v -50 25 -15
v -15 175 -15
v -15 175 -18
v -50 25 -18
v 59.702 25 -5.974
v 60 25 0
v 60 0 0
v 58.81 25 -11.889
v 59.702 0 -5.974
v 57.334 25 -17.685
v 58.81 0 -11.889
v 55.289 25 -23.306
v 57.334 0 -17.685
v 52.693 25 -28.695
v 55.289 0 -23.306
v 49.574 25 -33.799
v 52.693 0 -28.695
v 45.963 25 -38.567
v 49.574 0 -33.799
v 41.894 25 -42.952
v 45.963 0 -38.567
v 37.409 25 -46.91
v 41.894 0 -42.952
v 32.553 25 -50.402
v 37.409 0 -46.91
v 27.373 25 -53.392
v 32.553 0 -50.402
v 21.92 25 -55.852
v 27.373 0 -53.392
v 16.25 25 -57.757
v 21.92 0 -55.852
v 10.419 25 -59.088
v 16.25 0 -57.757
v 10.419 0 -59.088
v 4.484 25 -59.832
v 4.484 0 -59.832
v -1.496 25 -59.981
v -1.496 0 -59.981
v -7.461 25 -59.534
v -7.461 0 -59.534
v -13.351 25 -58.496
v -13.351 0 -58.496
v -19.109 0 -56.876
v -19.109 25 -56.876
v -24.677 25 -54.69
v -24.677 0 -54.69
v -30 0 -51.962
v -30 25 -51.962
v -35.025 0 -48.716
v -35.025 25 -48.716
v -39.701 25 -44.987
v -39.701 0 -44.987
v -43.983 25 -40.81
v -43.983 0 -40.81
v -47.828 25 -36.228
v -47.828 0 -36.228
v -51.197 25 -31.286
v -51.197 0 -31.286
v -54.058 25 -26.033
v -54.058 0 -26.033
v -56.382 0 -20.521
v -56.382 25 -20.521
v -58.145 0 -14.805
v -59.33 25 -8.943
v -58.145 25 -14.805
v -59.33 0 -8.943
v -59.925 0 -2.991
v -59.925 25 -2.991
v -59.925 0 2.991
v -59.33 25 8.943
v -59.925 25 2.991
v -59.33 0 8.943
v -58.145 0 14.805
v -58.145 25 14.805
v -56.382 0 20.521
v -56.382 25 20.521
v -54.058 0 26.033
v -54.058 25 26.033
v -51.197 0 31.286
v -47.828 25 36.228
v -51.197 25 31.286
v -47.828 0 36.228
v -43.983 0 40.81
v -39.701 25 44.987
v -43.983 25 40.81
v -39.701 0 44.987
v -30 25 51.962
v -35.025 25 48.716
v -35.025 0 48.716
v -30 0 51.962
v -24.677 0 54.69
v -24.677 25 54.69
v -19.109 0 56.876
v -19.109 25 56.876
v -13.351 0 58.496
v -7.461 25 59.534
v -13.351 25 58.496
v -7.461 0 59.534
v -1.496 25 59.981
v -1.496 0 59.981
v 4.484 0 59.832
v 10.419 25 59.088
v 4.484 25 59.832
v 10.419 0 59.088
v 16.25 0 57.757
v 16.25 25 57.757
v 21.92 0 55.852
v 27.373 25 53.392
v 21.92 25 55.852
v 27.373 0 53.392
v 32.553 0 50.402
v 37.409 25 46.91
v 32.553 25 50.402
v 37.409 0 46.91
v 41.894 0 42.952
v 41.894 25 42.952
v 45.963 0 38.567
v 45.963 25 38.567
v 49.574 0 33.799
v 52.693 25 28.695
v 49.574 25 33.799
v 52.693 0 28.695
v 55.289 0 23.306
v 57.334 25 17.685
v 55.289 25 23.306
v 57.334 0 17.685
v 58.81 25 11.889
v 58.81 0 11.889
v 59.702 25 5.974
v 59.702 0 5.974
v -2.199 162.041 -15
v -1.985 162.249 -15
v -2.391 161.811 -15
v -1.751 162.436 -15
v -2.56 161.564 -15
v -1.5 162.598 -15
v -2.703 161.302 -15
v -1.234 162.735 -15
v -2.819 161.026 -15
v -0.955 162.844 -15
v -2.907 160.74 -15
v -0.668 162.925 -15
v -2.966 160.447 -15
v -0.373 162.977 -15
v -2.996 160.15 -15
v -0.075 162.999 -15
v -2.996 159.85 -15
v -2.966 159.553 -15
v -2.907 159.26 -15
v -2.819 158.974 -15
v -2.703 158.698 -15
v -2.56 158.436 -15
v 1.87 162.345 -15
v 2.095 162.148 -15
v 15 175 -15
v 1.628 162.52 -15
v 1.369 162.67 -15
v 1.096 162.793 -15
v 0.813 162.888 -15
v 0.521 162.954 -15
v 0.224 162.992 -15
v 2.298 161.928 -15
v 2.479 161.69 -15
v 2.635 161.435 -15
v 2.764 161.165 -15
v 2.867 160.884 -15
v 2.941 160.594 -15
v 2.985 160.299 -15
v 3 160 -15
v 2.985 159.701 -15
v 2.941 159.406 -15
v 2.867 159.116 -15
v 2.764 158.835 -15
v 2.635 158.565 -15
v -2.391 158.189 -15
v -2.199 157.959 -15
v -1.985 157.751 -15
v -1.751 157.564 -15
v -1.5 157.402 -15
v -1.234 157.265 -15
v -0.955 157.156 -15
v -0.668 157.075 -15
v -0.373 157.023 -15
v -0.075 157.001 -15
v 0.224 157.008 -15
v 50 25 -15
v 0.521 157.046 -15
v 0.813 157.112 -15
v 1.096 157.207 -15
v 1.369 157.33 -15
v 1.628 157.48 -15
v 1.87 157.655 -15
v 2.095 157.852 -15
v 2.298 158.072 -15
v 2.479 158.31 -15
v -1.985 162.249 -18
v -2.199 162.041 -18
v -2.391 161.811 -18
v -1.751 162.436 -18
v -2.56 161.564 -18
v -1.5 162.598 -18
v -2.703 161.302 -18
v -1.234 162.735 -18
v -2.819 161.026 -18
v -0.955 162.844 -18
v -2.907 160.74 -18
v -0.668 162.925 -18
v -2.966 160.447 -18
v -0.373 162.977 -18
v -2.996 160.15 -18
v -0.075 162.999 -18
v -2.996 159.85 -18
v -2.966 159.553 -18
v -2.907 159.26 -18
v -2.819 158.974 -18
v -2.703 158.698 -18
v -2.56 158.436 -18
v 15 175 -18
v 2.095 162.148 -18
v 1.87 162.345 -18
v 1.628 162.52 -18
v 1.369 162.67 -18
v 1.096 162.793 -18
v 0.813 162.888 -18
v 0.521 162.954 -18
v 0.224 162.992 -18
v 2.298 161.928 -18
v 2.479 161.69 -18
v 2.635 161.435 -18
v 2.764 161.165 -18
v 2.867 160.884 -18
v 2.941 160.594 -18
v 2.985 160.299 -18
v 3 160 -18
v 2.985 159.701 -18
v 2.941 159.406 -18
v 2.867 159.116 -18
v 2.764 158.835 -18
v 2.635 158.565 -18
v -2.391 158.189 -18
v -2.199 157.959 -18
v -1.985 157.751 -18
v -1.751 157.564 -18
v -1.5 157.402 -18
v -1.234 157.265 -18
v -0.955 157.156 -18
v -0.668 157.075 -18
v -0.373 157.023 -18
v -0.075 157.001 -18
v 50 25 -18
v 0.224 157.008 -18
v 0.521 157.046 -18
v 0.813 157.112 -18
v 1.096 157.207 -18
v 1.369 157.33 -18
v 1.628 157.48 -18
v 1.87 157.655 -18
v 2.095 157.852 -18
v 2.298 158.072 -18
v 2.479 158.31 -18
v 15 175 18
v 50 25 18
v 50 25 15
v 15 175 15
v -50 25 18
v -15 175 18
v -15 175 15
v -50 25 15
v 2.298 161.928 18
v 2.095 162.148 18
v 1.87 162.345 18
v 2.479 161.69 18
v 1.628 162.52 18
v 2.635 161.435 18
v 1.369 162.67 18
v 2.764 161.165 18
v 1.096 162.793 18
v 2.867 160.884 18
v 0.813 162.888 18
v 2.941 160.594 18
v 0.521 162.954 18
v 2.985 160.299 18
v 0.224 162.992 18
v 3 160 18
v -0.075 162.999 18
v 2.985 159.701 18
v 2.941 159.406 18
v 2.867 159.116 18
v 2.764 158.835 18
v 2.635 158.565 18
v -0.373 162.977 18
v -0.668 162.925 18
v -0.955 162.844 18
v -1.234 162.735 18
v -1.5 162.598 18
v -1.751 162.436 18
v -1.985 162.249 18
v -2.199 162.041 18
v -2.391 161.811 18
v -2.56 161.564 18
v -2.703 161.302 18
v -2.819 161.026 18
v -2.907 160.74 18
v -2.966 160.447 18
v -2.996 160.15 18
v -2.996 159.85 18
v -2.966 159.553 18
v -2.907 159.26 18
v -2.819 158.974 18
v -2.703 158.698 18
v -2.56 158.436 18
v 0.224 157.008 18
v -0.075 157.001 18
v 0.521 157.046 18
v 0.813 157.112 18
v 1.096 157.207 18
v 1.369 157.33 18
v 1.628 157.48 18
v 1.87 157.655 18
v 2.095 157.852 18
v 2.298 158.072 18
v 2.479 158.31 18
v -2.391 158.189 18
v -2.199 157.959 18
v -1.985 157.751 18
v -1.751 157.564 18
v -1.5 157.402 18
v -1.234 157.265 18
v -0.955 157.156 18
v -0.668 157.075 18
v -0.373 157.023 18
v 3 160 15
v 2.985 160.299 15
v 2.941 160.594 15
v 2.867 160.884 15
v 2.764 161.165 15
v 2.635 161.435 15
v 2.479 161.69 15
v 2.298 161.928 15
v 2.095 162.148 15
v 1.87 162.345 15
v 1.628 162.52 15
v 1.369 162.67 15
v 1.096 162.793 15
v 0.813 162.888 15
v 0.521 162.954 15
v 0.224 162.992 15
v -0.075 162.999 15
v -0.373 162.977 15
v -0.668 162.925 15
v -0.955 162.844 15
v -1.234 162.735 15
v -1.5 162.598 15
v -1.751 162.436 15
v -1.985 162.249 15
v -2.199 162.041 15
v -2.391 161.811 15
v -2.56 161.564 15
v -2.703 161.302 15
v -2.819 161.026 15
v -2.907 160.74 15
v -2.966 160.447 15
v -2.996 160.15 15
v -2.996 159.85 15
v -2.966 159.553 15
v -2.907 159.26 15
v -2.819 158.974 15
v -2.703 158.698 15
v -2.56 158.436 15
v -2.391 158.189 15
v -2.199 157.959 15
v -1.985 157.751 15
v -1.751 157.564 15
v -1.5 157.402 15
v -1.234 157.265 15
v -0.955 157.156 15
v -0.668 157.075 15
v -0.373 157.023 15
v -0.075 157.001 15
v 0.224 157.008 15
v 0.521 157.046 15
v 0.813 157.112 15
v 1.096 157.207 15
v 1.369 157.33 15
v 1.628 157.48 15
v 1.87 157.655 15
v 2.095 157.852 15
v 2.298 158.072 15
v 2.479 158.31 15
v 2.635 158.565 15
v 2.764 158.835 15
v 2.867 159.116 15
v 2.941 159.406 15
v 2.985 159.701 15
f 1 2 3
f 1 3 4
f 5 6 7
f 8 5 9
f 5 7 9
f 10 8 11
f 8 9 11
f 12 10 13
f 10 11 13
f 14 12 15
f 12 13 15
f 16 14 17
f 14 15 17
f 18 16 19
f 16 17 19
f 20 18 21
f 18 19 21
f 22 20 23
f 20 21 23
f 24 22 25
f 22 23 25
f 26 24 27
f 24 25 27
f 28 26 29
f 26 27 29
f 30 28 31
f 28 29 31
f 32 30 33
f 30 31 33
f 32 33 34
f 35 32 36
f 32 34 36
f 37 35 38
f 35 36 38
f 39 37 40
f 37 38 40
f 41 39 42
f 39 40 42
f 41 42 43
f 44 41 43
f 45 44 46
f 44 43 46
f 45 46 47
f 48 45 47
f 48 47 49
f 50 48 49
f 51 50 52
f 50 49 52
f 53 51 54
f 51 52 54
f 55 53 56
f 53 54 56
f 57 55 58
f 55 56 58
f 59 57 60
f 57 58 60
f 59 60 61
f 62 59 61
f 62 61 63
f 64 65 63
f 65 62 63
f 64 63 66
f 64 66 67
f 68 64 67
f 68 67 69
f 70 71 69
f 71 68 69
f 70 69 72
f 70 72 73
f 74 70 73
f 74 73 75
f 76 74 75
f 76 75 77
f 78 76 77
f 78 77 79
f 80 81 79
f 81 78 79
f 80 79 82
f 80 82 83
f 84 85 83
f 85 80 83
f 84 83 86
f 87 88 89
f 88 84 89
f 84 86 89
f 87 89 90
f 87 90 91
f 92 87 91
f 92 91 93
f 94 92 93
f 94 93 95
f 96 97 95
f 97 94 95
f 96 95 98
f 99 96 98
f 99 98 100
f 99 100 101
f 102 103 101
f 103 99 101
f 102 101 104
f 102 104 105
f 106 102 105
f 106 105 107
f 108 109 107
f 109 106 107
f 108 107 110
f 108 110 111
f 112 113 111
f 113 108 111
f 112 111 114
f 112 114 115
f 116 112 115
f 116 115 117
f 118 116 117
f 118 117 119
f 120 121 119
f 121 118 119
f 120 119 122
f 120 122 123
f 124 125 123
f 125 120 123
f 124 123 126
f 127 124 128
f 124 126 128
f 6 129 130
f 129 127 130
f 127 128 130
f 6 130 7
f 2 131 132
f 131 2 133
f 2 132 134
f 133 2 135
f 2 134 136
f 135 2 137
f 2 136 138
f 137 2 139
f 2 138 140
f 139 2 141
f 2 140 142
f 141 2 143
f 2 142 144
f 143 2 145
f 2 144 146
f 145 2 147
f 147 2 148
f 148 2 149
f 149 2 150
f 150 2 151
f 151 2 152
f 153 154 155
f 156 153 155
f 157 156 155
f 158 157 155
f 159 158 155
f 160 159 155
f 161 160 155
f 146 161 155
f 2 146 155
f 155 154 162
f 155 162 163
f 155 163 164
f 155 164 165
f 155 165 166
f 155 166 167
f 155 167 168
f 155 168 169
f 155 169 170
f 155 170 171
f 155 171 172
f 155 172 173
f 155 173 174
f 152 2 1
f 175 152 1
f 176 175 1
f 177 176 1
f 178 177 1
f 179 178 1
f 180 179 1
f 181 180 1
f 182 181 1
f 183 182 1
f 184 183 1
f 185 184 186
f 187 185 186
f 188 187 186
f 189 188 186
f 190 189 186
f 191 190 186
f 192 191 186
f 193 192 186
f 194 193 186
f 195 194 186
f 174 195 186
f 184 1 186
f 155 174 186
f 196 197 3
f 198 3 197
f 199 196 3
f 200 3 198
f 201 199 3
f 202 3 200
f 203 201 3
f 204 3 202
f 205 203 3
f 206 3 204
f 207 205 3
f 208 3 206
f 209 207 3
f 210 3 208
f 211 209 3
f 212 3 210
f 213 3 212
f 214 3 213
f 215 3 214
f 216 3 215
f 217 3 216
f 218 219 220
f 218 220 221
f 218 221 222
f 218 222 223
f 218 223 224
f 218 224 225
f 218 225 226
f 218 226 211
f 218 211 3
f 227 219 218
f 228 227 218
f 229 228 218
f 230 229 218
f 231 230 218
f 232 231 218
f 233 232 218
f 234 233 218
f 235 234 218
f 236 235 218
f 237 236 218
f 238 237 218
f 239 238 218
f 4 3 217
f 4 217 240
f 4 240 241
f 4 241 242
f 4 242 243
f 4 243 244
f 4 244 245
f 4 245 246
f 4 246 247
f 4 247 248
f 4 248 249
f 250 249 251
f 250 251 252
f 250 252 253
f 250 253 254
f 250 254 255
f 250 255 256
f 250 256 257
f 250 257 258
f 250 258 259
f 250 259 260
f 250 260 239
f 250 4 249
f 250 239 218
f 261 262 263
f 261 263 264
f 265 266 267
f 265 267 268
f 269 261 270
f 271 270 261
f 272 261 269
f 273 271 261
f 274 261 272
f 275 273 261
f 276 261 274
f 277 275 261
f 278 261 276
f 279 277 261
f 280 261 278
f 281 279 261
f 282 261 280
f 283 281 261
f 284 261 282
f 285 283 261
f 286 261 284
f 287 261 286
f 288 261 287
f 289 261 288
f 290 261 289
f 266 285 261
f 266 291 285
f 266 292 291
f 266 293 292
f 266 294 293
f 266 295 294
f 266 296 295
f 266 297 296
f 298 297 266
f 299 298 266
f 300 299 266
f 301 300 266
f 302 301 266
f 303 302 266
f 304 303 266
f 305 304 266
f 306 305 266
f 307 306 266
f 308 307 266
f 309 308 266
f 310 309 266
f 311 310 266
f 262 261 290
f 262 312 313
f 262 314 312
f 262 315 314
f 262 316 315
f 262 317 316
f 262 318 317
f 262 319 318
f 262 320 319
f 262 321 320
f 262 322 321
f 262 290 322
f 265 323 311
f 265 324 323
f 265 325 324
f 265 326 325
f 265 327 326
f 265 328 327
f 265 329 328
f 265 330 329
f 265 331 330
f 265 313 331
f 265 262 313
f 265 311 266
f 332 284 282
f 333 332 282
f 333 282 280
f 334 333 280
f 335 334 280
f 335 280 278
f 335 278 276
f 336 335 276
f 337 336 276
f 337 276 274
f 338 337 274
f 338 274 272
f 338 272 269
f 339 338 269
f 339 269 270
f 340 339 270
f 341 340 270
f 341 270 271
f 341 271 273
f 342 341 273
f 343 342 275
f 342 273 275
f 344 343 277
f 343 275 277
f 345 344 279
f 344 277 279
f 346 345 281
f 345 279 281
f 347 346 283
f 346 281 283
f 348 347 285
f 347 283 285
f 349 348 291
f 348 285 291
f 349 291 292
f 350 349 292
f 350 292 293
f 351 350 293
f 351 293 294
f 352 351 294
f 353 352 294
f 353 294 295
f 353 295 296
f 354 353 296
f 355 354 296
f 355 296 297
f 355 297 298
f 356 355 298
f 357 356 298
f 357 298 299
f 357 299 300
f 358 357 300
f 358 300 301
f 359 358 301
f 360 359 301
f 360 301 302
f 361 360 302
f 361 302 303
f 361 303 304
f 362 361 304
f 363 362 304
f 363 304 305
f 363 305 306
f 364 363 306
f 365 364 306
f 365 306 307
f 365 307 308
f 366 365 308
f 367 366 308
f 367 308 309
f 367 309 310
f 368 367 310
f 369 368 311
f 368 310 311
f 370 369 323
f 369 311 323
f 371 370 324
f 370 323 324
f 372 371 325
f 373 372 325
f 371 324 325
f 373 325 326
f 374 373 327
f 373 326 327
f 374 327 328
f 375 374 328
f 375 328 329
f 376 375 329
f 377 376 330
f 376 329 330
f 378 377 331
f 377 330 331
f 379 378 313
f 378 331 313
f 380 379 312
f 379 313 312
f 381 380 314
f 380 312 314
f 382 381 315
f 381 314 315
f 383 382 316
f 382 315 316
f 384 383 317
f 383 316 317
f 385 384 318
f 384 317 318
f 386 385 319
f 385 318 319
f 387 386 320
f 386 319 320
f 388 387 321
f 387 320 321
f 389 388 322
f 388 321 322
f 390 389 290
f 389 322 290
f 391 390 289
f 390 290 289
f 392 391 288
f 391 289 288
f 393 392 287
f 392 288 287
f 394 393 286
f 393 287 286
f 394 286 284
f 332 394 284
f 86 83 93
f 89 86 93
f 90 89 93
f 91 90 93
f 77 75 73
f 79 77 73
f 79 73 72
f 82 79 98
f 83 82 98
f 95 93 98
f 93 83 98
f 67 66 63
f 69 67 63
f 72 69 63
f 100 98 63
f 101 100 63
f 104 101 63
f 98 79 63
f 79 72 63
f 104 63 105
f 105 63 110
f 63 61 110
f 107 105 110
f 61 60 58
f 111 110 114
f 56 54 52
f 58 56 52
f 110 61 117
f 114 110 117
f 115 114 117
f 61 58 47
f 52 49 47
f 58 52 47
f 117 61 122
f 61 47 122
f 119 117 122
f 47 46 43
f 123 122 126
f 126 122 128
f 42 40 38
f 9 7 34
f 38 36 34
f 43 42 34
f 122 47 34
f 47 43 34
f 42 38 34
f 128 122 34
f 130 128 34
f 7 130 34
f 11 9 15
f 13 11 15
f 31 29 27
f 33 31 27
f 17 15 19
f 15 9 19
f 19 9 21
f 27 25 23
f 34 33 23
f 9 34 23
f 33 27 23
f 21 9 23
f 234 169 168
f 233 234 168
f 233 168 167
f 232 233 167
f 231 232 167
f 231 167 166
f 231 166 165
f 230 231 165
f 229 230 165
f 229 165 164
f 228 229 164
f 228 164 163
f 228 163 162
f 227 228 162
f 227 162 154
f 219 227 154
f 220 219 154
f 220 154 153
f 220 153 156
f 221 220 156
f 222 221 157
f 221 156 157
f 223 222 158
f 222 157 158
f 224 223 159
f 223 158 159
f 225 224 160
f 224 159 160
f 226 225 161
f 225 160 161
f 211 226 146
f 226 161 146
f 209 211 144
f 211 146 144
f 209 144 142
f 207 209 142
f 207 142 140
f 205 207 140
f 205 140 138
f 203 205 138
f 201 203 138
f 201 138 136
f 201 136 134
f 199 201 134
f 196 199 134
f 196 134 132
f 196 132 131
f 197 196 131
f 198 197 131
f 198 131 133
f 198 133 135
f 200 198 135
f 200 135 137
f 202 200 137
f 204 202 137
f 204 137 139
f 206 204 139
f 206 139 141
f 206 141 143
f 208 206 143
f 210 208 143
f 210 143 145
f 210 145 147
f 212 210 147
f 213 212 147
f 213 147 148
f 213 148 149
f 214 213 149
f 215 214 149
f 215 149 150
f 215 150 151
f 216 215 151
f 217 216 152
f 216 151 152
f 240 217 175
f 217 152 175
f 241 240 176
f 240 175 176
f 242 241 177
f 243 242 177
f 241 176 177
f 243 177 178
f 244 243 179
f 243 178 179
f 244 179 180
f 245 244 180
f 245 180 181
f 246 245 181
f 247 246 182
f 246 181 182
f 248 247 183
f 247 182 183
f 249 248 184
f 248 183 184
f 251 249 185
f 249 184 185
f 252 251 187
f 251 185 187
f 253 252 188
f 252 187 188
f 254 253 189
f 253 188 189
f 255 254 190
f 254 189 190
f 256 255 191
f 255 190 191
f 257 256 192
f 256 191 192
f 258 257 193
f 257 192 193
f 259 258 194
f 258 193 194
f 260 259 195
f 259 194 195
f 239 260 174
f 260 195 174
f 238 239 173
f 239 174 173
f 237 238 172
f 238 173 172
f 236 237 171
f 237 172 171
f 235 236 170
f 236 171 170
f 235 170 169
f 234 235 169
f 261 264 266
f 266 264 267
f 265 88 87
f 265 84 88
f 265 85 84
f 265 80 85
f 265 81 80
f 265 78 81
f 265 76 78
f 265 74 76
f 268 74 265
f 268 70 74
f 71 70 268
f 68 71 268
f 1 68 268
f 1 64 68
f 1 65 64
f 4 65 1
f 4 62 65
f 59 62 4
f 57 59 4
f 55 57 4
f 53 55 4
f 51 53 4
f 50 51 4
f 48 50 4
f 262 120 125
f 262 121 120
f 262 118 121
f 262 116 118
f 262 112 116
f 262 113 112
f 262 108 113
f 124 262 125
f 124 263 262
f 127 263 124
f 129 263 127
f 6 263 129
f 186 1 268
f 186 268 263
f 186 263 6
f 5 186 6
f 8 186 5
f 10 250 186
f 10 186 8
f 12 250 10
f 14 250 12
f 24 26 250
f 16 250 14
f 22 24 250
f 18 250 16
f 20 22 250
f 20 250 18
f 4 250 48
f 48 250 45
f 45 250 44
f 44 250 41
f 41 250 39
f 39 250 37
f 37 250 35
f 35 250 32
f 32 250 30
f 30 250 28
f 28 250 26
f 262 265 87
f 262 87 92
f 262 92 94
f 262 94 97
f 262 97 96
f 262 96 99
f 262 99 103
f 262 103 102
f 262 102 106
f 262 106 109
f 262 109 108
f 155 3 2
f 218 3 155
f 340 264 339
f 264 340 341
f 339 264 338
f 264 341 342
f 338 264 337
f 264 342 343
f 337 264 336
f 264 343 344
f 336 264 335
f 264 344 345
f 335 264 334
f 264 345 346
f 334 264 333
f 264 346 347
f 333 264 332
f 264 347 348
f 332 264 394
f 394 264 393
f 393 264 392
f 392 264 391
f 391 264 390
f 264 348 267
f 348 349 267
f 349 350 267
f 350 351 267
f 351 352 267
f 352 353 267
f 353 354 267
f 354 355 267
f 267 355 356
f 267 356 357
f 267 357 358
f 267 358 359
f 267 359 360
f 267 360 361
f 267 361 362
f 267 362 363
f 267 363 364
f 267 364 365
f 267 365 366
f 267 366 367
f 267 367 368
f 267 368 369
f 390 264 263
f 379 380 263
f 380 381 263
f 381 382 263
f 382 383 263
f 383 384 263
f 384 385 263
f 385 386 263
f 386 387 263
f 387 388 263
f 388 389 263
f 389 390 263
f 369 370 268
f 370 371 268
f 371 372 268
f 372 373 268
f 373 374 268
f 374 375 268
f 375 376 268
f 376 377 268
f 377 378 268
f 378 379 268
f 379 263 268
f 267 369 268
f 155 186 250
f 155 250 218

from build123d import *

# Parameters (mm, degrees)
CROQUIS1_R              = 60
SALIENTE_EXTRUIR3_DEPTH = 25
CROQUIS4_W              = 100
CROQUIS4_H              = 3
SALIENTE_EXTRUIR5_DEPTH = 150
CORTAR_EXTRUIR3_DEPTH   = 150
CROQUIS11_R             = 3
CORTAR_EXTRUIR4_DEPTH   = 150


with BuildPart() as part:
    # Croquis1 → Saliente-Extruir3 (new body)
    with BuildSketch(Plane(origin=(0, 0, 0), x_dir=(1, 0, 0), z_dir=(0, 1, 0))):
        Circle(CROQUIS1_R)
    extrude(amount=SALIENTE_EXTRUIR3_DEPTH)

    # Croquis4 → Saliente-Extruir5 (add)
    with BuildSketch(Plane(origin=(0, 25, 0), x_dir=(1, 0, 0), z_dir=(0, 1, 0))):
        with Locations((0, 16.5)):
            Rectangle(CROQUIS4_W, CROQUIS4_H)
        Polygon((0, -15), (50, -15), (50, -18), (-50, -18), (-50, -15), align=None)
    extrude(amount=SALIENTE_EXTRUIR5_DEPTH)

    # Croquis10 → Cortar-Extruir3 (cut)
    with BuildSketch(Plane.XY.offset(18)):
        Polygon((-50, 175), (-15, 175), (-50, 25), align=None)
        Polygon((50, 25), (15, 175), (50, 175), align=None)
    extrude(amount=-CORTAR_EXTRUIR3_DEPTH, mode=Mode.SUBTRACT)

    # Croquis11 → Cortar-Extruir4 (cut)
    with BuildSketch(Plane.XY.offset(18)):
        with Locations((0, 160)):
            Circle(CROQUIS11_R)
    extrude(amount=-CORTAR_EXTRUIR4_DEPTH, mode=Mode.SUBTRACT)


solid = part.part
